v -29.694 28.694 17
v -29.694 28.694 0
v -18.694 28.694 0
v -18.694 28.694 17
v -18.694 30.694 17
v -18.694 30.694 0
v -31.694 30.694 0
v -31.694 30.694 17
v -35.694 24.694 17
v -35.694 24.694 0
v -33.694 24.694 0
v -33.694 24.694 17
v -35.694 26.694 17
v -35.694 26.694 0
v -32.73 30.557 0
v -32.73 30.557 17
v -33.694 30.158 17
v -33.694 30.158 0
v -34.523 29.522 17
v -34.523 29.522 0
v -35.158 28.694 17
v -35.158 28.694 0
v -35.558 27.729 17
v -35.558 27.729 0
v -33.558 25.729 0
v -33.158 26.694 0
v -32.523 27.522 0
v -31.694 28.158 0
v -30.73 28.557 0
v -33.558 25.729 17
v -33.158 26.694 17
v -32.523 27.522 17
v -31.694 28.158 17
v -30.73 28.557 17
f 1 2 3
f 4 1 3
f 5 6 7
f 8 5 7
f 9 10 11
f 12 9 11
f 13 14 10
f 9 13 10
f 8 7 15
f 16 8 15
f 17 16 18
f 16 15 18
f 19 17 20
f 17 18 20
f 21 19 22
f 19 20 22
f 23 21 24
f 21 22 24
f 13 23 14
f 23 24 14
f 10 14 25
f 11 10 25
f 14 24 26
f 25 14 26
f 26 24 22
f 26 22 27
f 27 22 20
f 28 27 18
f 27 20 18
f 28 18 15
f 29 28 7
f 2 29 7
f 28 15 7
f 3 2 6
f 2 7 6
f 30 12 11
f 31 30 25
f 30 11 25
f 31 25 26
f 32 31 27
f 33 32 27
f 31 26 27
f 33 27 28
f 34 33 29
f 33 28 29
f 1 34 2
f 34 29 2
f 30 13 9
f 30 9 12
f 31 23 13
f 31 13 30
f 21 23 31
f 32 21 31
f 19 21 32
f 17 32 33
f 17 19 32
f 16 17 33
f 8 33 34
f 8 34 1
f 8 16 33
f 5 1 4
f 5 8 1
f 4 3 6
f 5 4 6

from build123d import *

# Parameters (mm, degrees)
F1_DEPTH = 17


with BuildPart() as f1:
    # F0 (on Top) → F1 (new body)
    with BuildSketch(Plane.XY):
        with BuildLine():
            Line((-18.694246, 28.693632), (-18.694246, 30.693632))
            Line((-18.694246, 30.693632), (-31.694246, 30.693632))
            ThreePointArc((-31.694246, 30.693632), (-34.522673, 29.522059), (-35.694246, 26.693632))
            Line((-35.694246, 26.693632), (-35.694246, 24.693632))
            Line((-35.694246, 24.693632), (-33.694246, 24.693632))
            ThreePointArc((-33.694246, 24.693632), (-32.522673, 27.522059), (-29.694246, 28.693632))
            Line((-29.694246, 28.693632), (-18.694246, 28.693632))
        make_face()
    extrude(amount=F1_DEPTH)


solid = f1.part
